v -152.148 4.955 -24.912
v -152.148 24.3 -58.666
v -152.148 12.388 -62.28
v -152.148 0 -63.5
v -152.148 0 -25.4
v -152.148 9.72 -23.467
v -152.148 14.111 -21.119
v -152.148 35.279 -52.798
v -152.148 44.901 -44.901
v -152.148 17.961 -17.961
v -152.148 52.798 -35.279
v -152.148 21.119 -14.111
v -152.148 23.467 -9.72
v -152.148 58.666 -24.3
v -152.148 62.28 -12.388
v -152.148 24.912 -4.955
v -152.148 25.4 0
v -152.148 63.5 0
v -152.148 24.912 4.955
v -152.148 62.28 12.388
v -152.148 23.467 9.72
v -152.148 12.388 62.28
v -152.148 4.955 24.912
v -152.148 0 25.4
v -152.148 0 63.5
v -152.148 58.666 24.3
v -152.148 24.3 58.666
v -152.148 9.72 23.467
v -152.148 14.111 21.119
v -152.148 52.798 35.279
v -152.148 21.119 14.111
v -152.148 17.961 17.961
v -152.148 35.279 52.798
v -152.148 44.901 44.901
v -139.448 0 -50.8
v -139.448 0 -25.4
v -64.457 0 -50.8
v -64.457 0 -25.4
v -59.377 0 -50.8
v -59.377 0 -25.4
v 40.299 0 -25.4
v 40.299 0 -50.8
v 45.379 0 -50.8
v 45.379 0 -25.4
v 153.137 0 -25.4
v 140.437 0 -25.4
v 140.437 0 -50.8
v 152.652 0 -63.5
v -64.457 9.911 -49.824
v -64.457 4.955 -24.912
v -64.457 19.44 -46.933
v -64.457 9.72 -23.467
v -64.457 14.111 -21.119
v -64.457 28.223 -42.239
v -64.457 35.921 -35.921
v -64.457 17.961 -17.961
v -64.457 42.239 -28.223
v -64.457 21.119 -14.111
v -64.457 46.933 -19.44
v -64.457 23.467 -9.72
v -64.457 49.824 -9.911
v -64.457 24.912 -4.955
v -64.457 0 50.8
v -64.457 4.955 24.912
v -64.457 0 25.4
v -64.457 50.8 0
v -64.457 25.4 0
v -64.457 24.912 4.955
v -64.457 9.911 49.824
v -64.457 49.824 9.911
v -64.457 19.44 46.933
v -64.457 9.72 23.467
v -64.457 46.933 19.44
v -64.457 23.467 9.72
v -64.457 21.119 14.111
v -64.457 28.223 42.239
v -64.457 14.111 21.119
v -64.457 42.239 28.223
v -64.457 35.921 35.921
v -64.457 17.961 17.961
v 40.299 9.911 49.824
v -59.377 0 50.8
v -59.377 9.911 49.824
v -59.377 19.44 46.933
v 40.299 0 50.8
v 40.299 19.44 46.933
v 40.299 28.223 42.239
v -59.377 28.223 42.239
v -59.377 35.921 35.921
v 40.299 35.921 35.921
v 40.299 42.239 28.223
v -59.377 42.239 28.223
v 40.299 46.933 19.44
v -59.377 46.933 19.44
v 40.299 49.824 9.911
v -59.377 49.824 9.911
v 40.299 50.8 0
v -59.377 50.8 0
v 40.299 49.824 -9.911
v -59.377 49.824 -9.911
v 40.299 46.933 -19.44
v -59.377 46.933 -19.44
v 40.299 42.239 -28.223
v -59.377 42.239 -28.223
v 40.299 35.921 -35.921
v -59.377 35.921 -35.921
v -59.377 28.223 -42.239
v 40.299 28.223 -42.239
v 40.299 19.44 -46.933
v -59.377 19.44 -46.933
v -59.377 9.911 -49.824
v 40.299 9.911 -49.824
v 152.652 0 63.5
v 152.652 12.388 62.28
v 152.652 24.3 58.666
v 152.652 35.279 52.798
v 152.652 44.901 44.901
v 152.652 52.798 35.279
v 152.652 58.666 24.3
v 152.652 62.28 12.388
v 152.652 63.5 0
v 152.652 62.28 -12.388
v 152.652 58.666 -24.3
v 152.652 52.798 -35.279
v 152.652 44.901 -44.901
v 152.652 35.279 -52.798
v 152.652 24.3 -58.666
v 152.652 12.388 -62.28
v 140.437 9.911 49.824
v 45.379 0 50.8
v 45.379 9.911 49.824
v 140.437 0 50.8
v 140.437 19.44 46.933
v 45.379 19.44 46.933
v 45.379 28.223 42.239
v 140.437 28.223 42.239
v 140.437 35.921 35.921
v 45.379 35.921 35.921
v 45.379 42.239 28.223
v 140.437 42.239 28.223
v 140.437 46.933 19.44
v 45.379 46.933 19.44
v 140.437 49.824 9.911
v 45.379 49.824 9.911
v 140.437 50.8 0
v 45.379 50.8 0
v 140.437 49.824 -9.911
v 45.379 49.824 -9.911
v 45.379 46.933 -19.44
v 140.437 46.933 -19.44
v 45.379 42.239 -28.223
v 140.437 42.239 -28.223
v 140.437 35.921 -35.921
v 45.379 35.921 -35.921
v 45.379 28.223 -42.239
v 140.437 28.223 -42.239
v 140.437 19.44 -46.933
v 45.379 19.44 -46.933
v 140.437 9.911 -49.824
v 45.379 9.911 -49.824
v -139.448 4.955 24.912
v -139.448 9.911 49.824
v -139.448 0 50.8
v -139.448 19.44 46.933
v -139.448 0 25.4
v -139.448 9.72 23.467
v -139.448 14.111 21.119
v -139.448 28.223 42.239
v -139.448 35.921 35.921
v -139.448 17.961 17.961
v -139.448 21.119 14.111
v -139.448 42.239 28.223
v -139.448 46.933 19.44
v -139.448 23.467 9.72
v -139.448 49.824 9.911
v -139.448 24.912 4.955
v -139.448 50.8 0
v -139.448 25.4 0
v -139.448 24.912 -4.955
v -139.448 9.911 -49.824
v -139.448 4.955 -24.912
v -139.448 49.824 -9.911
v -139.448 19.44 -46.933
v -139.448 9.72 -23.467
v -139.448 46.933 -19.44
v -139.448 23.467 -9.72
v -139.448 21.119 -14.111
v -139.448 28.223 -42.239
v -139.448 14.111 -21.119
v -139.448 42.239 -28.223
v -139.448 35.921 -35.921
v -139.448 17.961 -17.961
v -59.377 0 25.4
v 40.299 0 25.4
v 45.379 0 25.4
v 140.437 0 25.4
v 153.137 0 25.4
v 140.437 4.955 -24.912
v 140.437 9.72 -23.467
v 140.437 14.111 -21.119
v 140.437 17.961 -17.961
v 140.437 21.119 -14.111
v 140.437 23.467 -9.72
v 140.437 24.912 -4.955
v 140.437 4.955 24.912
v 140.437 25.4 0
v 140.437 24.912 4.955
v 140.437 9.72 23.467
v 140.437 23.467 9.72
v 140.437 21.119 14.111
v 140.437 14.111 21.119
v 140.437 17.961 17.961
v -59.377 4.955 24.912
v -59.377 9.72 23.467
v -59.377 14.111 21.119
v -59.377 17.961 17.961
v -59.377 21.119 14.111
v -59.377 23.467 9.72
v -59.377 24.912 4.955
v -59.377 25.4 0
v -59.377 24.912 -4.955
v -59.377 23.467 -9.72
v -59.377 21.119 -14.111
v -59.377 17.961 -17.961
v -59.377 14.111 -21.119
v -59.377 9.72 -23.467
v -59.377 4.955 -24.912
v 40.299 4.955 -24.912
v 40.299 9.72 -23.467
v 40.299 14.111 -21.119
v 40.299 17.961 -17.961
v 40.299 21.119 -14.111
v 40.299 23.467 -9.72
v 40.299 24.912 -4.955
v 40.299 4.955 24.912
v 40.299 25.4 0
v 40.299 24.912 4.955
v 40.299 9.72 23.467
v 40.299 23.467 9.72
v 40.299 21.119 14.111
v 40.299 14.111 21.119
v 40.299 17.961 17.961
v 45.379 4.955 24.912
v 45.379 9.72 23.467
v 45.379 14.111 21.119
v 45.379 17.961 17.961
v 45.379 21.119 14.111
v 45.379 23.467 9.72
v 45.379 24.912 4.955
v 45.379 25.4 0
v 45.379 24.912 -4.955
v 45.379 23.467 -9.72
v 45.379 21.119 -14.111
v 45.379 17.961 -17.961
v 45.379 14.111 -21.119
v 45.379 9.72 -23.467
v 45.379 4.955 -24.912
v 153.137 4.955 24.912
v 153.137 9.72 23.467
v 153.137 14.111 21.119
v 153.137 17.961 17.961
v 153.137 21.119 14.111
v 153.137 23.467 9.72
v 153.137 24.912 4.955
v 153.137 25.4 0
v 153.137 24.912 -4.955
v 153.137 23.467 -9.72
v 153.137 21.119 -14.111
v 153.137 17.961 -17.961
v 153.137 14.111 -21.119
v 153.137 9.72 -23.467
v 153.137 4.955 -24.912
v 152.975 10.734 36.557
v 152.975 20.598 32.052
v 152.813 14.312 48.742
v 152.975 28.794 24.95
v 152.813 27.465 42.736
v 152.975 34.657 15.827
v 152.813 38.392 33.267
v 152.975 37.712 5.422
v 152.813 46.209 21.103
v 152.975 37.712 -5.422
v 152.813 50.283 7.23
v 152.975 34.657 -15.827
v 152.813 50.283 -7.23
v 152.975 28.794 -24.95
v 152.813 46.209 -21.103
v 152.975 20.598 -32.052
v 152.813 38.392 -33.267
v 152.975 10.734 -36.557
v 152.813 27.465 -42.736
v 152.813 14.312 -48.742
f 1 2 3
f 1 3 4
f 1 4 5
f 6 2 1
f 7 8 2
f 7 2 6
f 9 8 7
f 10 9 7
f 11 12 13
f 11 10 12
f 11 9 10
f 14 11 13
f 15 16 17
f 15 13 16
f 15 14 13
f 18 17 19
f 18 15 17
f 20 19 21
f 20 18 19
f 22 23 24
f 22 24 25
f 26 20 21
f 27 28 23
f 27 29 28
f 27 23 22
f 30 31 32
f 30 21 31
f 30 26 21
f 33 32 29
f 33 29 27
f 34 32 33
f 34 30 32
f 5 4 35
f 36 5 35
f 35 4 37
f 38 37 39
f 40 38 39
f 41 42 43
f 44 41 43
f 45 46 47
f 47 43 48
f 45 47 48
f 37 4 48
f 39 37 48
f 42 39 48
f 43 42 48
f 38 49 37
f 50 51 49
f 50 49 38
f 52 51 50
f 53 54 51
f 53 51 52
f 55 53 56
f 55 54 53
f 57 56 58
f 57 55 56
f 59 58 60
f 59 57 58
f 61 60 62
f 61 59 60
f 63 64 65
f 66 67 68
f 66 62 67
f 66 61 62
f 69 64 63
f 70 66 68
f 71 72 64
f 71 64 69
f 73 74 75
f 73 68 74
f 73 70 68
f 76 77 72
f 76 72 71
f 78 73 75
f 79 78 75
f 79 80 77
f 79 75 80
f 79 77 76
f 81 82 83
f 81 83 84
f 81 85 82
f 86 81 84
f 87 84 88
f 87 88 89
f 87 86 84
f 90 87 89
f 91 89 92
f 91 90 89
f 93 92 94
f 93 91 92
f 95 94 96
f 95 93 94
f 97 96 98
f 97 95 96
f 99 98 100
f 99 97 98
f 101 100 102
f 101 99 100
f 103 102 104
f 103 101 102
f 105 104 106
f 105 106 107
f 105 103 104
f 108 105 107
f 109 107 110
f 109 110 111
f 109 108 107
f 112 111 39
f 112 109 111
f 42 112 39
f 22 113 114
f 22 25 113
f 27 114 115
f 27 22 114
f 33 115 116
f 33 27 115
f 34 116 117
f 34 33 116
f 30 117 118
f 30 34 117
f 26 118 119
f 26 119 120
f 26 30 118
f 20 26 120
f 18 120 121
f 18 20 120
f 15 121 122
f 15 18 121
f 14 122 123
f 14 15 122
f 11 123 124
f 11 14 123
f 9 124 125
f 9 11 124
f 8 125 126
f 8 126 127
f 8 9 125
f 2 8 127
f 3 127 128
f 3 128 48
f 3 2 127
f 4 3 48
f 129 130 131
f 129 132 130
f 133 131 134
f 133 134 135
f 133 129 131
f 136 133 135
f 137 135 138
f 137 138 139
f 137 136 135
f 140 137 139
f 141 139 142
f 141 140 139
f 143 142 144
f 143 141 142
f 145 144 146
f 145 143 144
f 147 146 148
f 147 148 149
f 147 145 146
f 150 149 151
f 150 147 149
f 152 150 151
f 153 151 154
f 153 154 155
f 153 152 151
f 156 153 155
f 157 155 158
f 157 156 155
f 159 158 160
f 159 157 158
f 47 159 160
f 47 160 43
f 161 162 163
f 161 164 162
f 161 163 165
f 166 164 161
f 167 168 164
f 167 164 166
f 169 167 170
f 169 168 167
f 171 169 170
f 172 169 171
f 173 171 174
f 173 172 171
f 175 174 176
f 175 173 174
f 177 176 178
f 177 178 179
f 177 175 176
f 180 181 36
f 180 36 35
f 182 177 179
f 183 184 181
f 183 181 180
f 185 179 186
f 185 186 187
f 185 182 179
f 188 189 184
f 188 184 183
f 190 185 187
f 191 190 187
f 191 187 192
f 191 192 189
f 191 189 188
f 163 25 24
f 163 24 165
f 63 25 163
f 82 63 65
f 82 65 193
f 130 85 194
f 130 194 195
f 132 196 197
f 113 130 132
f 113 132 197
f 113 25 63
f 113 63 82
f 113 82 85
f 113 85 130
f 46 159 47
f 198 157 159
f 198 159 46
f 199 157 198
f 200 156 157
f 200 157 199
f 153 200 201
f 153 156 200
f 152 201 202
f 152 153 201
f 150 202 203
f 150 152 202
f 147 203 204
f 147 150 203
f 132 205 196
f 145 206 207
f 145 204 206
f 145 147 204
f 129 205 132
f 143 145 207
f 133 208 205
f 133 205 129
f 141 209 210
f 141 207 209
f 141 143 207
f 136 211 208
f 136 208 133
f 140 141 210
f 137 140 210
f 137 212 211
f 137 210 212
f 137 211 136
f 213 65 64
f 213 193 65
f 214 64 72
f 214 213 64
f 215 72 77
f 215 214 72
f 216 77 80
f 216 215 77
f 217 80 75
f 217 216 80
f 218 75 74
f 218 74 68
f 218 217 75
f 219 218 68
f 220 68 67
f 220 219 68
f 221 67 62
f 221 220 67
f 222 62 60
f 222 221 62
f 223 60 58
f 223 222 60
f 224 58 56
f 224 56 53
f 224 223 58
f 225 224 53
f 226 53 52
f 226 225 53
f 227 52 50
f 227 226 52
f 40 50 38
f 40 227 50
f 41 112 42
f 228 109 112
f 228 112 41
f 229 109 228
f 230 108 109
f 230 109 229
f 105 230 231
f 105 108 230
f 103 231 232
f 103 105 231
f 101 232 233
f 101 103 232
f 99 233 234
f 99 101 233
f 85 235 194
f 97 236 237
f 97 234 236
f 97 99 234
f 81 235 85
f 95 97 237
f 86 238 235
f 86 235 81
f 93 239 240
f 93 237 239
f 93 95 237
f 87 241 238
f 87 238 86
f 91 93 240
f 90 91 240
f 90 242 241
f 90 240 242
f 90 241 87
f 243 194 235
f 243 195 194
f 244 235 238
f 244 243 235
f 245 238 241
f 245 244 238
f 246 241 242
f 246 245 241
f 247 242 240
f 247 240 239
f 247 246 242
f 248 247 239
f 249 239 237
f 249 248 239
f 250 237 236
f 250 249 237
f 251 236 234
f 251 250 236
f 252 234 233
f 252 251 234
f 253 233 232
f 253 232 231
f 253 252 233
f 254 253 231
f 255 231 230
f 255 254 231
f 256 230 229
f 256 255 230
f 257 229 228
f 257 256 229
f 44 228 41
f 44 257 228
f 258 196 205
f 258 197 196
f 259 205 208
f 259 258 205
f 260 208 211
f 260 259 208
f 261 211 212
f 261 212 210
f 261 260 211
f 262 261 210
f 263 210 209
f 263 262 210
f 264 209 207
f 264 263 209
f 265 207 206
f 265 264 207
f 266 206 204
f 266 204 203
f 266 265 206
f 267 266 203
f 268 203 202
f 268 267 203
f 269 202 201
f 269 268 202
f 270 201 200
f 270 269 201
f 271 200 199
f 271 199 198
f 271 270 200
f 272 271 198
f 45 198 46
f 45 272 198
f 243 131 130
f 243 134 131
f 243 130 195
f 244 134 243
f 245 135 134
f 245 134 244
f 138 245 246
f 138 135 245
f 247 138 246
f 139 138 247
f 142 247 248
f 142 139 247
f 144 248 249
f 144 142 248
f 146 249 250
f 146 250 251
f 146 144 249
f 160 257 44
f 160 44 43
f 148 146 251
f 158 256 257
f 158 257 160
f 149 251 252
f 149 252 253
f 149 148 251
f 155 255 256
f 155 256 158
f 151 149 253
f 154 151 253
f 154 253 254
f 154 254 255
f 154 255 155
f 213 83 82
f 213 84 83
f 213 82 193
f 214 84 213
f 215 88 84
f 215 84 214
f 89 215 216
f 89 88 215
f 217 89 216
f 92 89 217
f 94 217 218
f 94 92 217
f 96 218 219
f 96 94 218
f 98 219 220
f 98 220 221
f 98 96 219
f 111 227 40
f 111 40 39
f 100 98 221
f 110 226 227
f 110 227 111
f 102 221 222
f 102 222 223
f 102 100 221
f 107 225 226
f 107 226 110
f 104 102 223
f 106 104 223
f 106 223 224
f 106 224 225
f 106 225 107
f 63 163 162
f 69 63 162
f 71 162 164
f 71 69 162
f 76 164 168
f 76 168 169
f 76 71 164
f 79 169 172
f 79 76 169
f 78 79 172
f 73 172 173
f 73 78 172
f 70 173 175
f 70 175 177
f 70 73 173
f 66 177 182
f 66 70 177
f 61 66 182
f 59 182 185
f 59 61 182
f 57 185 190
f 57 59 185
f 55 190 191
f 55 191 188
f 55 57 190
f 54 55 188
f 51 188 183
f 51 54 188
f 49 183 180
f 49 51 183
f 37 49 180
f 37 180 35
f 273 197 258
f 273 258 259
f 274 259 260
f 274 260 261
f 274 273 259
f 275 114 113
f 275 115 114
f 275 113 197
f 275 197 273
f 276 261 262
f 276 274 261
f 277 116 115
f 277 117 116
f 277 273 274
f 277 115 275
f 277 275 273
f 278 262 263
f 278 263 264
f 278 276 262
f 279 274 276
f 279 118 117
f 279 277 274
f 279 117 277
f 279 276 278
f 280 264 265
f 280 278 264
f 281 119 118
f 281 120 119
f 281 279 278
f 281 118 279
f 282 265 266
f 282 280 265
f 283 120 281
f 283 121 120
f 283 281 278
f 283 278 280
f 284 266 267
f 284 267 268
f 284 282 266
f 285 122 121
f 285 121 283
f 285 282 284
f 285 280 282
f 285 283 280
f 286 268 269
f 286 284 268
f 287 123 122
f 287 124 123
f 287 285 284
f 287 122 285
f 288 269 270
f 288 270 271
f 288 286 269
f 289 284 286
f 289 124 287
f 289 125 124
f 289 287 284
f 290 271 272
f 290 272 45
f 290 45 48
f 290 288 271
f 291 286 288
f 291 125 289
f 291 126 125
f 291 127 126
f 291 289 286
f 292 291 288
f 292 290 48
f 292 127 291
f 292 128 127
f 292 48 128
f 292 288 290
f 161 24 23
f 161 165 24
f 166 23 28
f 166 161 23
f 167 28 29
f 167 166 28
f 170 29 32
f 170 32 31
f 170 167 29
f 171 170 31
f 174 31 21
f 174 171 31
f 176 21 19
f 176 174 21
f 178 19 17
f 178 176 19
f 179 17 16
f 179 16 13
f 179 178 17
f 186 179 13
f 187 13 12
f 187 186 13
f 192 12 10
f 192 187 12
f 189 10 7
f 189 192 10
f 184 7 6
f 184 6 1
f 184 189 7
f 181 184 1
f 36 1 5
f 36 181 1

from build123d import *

# Parameters (mm, degrees)
F1_ANGLE = 180


with BuildPart() as f1:
    # F0 (on Front) → F1 (revolve)
    with BuildSketch(Plane.XZ):
        Polygon((152.651871, 63.5), (-152.148129, 63.5), (-152.148129, 25.4), (-139.448129, 25.4), (-139.448129, 50.8), (-64.457401, 50.8), (-64.457401, 25.4), (-59.377401, 25.4), (-59.377401, 50.8), (40.299118, 50.8), (40.299118, 25.4), (45.379118, 25.4), (45.379118, 50.8), (140.436626, 50.8), (140.436626, 25.4), (153.136626, 25.4), align=None)
    revolve(axis=Axis((20.847701, 0, 0), (-1, 0, 0)), revolution_arc=F1_ANGLE)


solid = f1.part
